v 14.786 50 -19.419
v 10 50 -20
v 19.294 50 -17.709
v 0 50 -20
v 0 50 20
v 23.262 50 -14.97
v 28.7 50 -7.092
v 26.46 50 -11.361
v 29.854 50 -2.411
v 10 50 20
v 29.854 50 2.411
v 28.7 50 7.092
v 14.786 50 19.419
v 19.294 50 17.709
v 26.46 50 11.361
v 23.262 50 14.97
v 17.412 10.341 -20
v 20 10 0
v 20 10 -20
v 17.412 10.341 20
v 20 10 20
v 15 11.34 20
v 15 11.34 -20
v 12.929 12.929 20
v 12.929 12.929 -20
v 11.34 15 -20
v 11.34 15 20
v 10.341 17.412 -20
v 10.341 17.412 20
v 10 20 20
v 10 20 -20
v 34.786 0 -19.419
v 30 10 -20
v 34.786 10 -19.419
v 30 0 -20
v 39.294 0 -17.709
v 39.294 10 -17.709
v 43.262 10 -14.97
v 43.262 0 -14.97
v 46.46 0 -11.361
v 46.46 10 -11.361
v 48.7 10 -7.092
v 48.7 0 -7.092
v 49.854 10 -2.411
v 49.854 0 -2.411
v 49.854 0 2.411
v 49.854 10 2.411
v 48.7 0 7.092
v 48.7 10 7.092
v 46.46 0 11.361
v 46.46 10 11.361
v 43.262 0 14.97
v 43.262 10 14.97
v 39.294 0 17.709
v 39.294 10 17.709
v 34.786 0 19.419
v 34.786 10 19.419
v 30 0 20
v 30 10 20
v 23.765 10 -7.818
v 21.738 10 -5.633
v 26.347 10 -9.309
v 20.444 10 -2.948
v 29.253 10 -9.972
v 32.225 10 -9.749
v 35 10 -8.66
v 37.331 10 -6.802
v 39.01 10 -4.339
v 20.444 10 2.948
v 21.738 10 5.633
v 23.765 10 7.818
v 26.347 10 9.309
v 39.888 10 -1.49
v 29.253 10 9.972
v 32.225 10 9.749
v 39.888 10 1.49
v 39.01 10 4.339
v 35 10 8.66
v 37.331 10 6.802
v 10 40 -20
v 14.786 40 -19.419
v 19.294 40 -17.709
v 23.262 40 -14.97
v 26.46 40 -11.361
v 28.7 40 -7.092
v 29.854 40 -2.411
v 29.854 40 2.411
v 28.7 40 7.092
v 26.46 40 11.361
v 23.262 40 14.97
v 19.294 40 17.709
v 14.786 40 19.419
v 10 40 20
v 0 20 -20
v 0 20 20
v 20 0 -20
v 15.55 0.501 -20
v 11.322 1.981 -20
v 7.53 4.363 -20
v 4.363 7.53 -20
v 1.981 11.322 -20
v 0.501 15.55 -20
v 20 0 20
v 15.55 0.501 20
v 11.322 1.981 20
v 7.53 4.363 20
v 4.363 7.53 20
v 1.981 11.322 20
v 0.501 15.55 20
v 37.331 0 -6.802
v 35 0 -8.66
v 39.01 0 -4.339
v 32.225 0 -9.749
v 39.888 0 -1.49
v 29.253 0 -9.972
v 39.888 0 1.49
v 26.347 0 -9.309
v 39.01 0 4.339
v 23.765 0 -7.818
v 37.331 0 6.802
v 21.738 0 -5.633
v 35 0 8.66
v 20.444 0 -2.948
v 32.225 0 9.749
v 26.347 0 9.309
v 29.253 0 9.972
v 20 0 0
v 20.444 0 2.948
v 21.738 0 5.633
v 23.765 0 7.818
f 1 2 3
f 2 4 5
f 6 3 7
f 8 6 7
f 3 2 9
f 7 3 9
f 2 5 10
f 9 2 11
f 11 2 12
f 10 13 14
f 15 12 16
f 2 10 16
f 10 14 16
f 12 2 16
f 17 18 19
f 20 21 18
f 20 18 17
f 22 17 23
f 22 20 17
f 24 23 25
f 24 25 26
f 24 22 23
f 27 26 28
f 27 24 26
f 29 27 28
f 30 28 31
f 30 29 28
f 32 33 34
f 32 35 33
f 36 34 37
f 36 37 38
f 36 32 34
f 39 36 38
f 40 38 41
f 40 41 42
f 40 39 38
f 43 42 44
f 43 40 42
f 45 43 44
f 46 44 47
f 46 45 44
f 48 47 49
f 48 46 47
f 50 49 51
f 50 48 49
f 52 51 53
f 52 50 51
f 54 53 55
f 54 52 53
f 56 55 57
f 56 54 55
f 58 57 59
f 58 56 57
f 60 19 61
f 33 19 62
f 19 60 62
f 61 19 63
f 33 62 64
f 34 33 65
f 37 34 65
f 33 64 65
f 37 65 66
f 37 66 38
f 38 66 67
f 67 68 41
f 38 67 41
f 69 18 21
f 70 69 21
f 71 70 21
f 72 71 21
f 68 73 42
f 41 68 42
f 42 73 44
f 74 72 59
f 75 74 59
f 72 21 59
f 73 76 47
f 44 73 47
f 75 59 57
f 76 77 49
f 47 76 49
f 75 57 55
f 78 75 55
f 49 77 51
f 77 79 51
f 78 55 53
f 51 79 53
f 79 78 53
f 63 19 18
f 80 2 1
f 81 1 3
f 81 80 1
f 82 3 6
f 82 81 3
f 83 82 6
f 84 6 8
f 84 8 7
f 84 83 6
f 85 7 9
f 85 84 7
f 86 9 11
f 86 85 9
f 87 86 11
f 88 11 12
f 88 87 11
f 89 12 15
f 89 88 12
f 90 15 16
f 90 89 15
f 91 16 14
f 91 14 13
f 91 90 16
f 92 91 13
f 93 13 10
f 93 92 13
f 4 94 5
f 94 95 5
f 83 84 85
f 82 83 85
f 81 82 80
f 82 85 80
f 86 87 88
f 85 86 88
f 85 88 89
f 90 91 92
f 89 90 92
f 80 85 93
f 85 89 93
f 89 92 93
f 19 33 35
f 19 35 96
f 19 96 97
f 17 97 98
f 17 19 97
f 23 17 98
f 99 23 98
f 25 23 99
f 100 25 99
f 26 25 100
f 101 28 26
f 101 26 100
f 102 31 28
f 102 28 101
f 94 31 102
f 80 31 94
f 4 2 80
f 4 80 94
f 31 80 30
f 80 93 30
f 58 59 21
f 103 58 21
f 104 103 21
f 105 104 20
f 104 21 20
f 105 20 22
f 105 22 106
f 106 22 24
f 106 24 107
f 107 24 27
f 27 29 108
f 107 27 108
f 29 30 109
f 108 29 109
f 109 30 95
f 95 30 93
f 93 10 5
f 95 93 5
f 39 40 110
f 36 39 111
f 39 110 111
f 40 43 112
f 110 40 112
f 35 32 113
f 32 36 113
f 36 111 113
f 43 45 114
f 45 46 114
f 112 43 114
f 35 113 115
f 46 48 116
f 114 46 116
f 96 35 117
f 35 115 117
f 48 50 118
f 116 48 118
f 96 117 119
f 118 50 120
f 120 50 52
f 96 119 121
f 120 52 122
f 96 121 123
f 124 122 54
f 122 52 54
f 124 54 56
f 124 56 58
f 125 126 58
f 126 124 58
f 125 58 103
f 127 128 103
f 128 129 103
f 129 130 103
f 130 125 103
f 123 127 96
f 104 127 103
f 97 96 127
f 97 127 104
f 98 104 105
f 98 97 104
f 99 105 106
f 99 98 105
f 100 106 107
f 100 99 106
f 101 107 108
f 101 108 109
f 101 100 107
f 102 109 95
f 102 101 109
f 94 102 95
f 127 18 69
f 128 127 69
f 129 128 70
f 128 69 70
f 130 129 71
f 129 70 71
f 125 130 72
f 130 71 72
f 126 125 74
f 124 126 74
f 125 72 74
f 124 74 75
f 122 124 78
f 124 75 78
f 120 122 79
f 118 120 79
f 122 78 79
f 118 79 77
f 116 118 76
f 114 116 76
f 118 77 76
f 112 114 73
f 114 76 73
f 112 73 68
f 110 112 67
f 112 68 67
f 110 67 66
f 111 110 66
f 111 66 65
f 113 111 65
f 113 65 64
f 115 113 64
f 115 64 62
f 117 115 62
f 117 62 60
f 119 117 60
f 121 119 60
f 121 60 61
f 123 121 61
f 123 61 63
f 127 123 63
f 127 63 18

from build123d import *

# Parameters (mm, degrees)
EXTRUDE_THIN1_DEPTH = 20
FILLET1_R           = 20
FILLET2_R           = 10
FILLET3_RADIUS      = 20
FILLET3_LENGTH      = 10
FILLET4_RADIUS      = 20
FILLET4_LENGTH      = 10
SKETCH2_R           = 10
CUT_EXTRUDE1_DEPTH  = 68.082039325


with BuildPart() as part:
    # Sketch1 → Extrude-Thin1 (new, symmetric)
    with BuildSketch(Plane.XY):
        Polygon((50, 0), (0, 0), (0, 50), (30, 50), (30, 40), (10, 40), (10, 10), (50, 10), align=None)
    extrude(amount=EXTRUDE_THIN1_DEPTH, both=True)

    # Fillet1
    fillet1_edges = [part.edges().sort_by_distance(p)[0] for p in [
        (0, 0, 0),
    ]]
    fillet(fillet1_edges, radius=FILLET1_R)

    # Fillet2
    fillet2_edges = [part.edges().sort_by_distance(p)[0] for p in [
        (10, 10, 0),
    ]]
    fillet(fillet2_edges, radius=FILLET2_R)

    # Fillet3: full round fillet: the end face becomes a half cylinder, R = half its width
    fillet3_face = Plane((30, 45, 0), x_dir=(0, -1, 0), z_dir=(1, 0, 0))  # on the end face: x along it, z out of the body
    fillet3_slab = fillet3_face.offset(-FILLET3_RADIUS / 2) * Box(FILLET3_LENGTH, 2 * FILLET3_RADIUS, FILLET3_RADIUS, mode=Mode.PRIVATE)  # the body's end, R deep
    fillet3_round = Plane((10, 45, 0), x_dir=(1, 0, 0), z_dir=(0, -1, 0)) * Cylinder(FILLET3_RADIUS, FILLET3_LENGTH, mode=Mode.PRIVATE)  # its axis R under the face
    add(fillet3_slab - fillet3_round, mode=Mode.SUBTRACT)

    # Fillet4: full round fillet: the end face becomes a half cylinder, R = half its width
    fillet4_face = Plane((50, 5, 0), x_dir=(0, -1, 0), z_dir=(1, 0, 0))  # on the end face: x along it, z out of the body
    fillet4_slab = fillet4_face.offset(-FILLET4_RADIUS / 2) * Box(FILLET4_LENGTH, 2 * FILLET4_RADIUS, FILLET4_RADIUS, mode=Mode.PRIVATE)  # the body's end, R deep
    fillet4_round = Plane((30, 5, 0), x_dir=(1, 0, 0), z_dir=(0, -1, 0)) * Cylinder(FILLET4_RADIUS, FILLET4_LENGTH, mode=Mode.PRIVATE)  # its axis R under the face
    add(fillet4_slab - fillet4_round, mode=Mode.SUBTRACT)

    # Sketch2 → Cut-Extrude1 (cut, through all)
    with BuildSketch(Plane(origin=(0, 10, 0), x_dir=(1, 0, 0), z_dir=(0, 1, 0))):
        with Locations(Location((30, 0, 0), (0, 0, 180))):
            Circle(SKETCH2_R)
    extrude(amount=-CUT_EXTRUDE1_DEPTH, mode=Mode.SUBTRACT)


solid = part.part
